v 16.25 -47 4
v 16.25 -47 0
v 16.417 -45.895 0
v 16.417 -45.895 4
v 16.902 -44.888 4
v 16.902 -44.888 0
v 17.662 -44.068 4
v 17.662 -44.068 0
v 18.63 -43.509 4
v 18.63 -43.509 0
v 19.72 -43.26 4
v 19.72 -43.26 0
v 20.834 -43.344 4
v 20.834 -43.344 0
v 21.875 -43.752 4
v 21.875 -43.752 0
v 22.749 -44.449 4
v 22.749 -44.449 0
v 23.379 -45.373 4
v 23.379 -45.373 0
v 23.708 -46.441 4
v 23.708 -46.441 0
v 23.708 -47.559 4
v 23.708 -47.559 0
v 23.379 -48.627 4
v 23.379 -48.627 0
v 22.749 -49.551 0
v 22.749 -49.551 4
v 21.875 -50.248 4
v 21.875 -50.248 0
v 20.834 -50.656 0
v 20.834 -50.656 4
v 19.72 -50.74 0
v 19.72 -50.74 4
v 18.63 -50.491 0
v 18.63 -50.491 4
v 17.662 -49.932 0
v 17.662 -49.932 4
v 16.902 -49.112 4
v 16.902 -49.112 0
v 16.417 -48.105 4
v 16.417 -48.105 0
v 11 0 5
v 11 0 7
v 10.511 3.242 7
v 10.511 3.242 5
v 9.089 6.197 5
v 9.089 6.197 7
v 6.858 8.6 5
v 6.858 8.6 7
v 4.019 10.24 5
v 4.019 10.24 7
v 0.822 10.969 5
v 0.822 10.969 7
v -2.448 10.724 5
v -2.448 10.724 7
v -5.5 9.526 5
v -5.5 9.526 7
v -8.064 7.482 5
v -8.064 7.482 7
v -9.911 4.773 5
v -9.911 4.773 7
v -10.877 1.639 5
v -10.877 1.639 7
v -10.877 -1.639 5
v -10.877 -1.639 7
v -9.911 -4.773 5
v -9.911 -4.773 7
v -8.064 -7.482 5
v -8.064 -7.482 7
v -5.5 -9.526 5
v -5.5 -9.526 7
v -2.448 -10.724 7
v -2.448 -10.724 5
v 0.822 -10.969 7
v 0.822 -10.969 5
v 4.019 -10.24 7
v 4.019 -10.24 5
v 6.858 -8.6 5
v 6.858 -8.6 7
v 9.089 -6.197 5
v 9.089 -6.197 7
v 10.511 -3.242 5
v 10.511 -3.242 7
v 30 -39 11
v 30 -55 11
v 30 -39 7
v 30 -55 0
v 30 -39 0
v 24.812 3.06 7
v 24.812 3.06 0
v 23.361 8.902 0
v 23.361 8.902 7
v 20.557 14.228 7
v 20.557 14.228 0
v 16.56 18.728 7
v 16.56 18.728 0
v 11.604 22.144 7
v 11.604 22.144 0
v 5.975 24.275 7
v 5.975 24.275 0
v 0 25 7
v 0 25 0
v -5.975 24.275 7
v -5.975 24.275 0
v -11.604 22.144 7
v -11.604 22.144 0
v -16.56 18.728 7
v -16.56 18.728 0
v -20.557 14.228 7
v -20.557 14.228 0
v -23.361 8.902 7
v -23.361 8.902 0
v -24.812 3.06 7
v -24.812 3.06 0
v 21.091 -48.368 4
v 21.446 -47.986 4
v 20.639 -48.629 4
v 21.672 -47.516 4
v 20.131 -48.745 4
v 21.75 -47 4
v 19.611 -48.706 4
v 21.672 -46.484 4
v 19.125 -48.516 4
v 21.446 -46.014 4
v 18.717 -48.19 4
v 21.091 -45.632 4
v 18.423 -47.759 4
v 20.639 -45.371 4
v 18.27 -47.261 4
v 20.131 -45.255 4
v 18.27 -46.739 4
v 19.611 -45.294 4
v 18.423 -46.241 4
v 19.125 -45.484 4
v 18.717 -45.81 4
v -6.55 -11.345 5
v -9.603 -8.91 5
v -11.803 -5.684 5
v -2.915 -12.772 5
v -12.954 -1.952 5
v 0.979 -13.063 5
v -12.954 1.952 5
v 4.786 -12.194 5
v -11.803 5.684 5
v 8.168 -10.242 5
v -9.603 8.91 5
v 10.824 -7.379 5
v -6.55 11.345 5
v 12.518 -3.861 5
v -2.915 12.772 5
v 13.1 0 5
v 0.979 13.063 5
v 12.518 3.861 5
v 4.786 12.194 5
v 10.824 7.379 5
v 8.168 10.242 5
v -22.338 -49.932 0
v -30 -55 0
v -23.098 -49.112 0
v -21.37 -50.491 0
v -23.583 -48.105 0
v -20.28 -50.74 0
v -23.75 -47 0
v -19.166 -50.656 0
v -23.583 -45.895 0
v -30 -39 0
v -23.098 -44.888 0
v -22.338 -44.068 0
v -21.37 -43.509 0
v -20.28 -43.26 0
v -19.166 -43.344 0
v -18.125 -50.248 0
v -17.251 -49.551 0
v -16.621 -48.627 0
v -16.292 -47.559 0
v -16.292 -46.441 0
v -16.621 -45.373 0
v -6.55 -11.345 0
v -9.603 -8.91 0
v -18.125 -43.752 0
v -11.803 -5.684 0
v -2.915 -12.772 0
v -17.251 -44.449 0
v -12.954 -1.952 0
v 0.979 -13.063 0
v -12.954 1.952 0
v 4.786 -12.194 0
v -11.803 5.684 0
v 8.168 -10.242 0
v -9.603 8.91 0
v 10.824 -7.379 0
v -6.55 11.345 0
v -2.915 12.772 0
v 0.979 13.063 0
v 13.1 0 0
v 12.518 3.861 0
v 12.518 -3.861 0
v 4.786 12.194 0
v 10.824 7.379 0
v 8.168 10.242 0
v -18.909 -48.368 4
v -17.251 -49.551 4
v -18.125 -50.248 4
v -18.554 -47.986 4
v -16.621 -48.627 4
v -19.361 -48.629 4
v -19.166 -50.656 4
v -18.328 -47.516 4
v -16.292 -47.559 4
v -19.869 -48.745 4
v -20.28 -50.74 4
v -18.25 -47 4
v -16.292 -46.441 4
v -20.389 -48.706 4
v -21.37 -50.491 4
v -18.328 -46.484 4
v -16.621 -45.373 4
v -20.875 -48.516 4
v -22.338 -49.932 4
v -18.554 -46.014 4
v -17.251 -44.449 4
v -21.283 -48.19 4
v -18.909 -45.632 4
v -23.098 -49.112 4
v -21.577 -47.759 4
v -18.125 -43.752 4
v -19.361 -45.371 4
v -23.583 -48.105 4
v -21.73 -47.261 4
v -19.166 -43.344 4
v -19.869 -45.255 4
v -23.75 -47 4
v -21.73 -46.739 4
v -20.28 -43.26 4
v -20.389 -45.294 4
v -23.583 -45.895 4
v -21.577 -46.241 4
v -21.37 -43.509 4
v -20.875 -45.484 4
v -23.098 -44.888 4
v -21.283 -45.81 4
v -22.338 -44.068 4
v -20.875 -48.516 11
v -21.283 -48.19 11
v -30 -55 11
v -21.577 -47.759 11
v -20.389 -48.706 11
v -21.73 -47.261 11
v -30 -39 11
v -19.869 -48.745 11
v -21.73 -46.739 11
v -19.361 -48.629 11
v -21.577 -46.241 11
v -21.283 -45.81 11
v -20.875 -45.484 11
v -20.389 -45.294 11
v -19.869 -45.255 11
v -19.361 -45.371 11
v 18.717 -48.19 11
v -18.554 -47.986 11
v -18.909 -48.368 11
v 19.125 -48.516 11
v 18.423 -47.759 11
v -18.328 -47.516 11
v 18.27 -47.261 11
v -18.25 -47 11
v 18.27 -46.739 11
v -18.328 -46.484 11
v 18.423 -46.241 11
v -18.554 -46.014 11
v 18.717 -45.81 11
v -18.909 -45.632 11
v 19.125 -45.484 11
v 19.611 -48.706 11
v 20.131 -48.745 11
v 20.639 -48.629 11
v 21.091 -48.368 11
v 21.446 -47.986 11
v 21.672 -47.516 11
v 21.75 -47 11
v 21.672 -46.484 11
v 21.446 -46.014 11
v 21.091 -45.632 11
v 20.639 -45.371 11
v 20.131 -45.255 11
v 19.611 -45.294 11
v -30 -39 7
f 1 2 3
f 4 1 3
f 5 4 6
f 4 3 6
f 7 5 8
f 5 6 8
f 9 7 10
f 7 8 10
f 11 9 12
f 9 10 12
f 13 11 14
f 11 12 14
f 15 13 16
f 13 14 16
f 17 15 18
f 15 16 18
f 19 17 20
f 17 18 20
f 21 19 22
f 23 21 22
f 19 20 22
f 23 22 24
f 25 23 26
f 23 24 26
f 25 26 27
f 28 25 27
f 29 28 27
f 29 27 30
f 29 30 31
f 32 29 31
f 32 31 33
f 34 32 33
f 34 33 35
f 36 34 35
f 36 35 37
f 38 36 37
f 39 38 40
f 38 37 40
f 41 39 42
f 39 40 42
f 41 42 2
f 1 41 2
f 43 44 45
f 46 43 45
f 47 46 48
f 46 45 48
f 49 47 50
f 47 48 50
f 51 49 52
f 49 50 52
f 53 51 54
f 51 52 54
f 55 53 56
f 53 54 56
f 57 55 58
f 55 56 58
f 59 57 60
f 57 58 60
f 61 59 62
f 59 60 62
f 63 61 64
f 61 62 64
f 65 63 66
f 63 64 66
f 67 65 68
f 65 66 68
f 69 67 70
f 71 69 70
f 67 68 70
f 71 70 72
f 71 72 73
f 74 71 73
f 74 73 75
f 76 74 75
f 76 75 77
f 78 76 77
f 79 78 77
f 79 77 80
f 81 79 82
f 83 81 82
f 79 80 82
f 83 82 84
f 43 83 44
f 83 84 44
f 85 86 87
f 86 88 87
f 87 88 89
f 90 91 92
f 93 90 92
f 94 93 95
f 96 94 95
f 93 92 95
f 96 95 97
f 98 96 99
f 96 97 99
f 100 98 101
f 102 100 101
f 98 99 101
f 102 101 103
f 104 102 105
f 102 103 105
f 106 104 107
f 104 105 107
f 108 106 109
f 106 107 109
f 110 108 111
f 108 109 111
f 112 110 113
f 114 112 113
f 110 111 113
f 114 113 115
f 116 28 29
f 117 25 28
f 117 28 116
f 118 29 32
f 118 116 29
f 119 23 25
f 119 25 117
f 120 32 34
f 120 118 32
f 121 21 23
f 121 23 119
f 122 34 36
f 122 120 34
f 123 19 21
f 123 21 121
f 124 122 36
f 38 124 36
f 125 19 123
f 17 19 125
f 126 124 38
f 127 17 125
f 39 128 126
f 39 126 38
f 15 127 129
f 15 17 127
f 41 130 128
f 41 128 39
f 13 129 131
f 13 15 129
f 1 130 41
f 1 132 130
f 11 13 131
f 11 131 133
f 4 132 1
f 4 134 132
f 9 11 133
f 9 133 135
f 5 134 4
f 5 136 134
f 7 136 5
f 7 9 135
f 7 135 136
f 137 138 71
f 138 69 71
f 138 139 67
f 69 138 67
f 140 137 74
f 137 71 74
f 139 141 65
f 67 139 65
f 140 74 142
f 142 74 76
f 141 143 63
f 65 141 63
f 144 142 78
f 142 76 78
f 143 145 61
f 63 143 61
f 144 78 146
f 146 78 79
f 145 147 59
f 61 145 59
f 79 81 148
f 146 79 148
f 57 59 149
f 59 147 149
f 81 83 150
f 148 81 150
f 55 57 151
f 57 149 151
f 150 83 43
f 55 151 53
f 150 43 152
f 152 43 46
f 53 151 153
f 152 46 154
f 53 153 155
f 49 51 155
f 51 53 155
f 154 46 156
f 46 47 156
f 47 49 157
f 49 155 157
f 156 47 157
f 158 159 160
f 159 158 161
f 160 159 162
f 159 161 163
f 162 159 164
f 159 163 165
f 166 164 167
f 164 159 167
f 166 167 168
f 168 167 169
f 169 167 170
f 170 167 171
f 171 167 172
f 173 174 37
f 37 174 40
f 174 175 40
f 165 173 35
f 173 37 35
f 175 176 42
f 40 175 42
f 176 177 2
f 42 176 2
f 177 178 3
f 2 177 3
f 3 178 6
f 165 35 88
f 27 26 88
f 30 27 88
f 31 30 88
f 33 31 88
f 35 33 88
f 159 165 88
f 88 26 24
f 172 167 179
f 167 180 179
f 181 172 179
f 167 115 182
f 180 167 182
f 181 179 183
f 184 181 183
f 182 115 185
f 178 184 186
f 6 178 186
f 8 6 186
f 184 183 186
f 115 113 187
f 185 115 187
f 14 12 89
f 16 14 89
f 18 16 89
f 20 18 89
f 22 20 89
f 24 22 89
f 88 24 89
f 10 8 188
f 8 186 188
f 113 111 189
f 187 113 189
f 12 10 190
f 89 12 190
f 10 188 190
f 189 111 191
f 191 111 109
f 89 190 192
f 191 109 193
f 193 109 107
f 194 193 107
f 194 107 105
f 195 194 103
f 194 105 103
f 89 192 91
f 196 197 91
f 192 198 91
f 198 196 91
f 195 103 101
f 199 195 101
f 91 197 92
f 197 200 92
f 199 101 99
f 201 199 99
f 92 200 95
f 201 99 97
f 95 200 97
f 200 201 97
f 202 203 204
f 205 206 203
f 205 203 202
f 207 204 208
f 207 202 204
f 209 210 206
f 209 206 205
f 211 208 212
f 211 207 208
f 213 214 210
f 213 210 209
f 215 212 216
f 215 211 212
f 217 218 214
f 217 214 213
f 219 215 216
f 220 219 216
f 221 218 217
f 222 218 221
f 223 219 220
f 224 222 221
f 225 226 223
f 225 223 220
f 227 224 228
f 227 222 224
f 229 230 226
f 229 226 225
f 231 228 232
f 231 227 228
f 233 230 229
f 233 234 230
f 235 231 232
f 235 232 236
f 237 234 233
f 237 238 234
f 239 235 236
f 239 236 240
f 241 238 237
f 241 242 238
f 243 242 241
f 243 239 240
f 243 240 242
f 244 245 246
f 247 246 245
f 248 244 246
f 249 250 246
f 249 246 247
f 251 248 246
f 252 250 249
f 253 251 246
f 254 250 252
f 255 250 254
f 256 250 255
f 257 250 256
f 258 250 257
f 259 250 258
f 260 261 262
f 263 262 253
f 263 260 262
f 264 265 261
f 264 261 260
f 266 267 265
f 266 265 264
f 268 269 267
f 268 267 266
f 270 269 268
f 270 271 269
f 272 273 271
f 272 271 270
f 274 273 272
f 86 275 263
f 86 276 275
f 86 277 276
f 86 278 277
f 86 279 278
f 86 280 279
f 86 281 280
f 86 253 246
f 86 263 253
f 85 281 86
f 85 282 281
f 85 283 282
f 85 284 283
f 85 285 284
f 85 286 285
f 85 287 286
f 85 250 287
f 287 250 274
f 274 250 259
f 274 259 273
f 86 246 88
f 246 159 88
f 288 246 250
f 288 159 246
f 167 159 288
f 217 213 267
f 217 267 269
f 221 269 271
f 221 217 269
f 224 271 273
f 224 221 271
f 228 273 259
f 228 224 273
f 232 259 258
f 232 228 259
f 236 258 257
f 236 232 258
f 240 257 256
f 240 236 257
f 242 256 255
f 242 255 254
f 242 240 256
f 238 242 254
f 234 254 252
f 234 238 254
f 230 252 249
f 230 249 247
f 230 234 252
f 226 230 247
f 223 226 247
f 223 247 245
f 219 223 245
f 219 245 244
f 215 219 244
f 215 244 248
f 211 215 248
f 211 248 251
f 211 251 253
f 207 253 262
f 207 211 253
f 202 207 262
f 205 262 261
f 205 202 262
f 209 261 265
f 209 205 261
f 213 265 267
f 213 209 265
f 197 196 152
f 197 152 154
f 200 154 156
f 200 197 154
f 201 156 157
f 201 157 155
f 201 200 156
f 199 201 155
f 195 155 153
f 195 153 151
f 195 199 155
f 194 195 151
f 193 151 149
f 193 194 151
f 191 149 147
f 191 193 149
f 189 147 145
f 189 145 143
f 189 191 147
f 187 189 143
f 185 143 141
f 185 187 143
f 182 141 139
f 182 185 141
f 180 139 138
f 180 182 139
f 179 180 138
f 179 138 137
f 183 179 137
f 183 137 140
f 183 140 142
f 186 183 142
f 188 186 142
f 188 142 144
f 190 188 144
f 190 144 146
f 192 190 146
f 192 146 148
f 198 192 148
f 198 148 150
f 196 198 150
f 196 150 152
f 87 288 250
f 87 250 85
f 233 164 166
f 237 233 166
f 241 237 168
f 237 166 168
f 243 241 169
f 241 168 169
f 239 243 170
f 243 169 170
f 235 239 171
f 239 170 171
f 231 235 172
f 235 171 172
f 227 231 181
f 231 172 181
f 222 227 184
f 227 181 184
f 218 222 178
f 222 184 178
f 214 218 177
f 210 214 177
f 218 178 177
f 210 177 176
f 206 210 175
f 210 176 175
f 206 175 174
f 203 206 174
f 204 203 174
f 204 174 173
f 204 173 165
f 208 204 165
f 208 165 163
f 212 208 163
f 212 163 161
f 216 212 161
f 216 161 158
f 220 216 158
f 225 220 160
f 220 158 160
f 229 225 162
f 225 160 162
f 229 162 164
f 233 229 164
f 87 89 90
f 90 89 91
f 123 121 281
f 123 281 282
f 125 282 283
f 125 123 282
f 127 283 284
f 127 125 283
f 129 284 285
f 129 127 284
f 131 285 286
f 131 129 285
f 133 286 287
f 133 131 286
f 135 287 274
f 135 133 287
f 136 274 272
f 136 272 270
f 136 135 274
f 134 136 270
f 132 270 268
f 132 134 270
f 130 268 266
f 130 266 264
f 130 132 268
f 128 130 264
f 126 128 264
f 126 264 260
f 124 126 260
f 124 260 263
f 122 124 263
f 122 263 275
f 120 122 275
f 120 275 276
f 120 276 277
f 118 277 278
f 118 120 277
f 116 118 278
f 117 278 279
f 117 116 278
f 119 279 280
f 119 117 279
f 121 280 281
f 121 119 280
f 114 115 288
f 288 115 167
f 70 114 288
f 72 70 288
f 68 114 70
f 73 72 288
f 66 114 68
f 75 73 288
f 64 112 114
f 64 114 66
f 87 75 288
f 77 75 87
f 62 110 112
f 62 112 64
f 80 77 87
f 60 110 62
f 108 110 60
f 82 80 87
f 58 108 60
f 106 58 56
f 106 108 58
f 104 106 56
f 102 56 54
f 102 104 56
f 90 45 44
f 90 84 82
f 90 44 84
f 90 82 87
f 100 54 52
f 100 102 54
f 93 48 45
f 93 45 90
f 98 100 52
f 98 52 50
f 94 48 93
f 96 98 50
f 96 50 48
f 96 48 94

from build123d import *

# Parameters (mm, degrees)
SKETCH1_R           = 13.1
SKETCH1_R_2         = 1.75
BOSS_EXTRUDE1_DEPTH = 7
SKETCH2_R           = 13.1
SKETCH2_R_2         = 11
BOSS_EXTRUDE2_DEPTH = 2
SKETCH3_W           = 60
SKETCH3_H           = 16
SKETCH3_R           = 1.75
BOSS_EXTRUDE3_DEPTH = 4
SKETCH4_R           = 3.75
CUT_EXTRUDE1_DEPTH  = 4


with BuildPart() as part:
    # Sketch1 → Boss-Extrude1 (new body)
    with BuildSketch(Plane.XY):
        with BuildLine():
            Line((-30, -55), (30, -55))
            Line((30, -55), (30, -39))
            Line((30, -39), (24.811961667, 3.060483334))
            ThreePointArc((24.811961667, 3.060483334), (0, 25), (-24.811961667, 3.060483334))
            Line((-24.811961667, 3.060483334), (-30, -39))
            Line((-30, -39), (-30, -55))
        make_face()
        Circle(SKETCH1_R, mode=Mode.SUBTRACT)
        with Locations((-20, -47)):
            Circle(SKETCH1_R_2, mode=Mode.SUBTRACT)
        with Locations((20, -47)):
            Circle(SKETCH1_R_2, mode=Mode.SUBTRACT)
    extrude(amount=BOSS_EXTRUDE1_DEPTH)

    # Sketch2 → Boss-Extrude2 (add)
    with BuildSketch(Plane.XY.offset(7)):
        Circle(SKETCH2_R)
        Circle(SKETCH2_R_2, mode=Mode.SUBTRACT)
    extrude(amount=-BOSS_EXTRUDE2_DEPTH)

    # Sketch3 → Boss-Extrude3 (add)
    with BuildSketch(Plane.XY.offset(7)):
        with Locations((0, -47)):
            Rectangle(SKETCH3_W, SKETCH3_H)
        with Locations((20, -47)):
            Circle(SKETCH3_R, mode=Mode.SUBTRACT)
        with Locations((-20, -47)):
            Circle(SKETCH3_R, mode=Mode.SUBTRACT)
    extrude(amount=BOSS_EXTRUDE3_DEPTH)

    # Sketch4 → Cut-Extrude1 (cut)
    with BuildSketch(Plane(origin=(0, 0, 0), x_dir=(-1, 0, 0), z_dir=(0, 0, -1))):
        with Locations((-20, -47)):
            Circle(SKETCH4_R)
        with Locations((20, -47)):
            Circle(SKETCH4_R)
    extrude(amount=-CUT_EXTRUDE1_DEPTH, mode=Mode.SUBTRACT)


solid = part.part
